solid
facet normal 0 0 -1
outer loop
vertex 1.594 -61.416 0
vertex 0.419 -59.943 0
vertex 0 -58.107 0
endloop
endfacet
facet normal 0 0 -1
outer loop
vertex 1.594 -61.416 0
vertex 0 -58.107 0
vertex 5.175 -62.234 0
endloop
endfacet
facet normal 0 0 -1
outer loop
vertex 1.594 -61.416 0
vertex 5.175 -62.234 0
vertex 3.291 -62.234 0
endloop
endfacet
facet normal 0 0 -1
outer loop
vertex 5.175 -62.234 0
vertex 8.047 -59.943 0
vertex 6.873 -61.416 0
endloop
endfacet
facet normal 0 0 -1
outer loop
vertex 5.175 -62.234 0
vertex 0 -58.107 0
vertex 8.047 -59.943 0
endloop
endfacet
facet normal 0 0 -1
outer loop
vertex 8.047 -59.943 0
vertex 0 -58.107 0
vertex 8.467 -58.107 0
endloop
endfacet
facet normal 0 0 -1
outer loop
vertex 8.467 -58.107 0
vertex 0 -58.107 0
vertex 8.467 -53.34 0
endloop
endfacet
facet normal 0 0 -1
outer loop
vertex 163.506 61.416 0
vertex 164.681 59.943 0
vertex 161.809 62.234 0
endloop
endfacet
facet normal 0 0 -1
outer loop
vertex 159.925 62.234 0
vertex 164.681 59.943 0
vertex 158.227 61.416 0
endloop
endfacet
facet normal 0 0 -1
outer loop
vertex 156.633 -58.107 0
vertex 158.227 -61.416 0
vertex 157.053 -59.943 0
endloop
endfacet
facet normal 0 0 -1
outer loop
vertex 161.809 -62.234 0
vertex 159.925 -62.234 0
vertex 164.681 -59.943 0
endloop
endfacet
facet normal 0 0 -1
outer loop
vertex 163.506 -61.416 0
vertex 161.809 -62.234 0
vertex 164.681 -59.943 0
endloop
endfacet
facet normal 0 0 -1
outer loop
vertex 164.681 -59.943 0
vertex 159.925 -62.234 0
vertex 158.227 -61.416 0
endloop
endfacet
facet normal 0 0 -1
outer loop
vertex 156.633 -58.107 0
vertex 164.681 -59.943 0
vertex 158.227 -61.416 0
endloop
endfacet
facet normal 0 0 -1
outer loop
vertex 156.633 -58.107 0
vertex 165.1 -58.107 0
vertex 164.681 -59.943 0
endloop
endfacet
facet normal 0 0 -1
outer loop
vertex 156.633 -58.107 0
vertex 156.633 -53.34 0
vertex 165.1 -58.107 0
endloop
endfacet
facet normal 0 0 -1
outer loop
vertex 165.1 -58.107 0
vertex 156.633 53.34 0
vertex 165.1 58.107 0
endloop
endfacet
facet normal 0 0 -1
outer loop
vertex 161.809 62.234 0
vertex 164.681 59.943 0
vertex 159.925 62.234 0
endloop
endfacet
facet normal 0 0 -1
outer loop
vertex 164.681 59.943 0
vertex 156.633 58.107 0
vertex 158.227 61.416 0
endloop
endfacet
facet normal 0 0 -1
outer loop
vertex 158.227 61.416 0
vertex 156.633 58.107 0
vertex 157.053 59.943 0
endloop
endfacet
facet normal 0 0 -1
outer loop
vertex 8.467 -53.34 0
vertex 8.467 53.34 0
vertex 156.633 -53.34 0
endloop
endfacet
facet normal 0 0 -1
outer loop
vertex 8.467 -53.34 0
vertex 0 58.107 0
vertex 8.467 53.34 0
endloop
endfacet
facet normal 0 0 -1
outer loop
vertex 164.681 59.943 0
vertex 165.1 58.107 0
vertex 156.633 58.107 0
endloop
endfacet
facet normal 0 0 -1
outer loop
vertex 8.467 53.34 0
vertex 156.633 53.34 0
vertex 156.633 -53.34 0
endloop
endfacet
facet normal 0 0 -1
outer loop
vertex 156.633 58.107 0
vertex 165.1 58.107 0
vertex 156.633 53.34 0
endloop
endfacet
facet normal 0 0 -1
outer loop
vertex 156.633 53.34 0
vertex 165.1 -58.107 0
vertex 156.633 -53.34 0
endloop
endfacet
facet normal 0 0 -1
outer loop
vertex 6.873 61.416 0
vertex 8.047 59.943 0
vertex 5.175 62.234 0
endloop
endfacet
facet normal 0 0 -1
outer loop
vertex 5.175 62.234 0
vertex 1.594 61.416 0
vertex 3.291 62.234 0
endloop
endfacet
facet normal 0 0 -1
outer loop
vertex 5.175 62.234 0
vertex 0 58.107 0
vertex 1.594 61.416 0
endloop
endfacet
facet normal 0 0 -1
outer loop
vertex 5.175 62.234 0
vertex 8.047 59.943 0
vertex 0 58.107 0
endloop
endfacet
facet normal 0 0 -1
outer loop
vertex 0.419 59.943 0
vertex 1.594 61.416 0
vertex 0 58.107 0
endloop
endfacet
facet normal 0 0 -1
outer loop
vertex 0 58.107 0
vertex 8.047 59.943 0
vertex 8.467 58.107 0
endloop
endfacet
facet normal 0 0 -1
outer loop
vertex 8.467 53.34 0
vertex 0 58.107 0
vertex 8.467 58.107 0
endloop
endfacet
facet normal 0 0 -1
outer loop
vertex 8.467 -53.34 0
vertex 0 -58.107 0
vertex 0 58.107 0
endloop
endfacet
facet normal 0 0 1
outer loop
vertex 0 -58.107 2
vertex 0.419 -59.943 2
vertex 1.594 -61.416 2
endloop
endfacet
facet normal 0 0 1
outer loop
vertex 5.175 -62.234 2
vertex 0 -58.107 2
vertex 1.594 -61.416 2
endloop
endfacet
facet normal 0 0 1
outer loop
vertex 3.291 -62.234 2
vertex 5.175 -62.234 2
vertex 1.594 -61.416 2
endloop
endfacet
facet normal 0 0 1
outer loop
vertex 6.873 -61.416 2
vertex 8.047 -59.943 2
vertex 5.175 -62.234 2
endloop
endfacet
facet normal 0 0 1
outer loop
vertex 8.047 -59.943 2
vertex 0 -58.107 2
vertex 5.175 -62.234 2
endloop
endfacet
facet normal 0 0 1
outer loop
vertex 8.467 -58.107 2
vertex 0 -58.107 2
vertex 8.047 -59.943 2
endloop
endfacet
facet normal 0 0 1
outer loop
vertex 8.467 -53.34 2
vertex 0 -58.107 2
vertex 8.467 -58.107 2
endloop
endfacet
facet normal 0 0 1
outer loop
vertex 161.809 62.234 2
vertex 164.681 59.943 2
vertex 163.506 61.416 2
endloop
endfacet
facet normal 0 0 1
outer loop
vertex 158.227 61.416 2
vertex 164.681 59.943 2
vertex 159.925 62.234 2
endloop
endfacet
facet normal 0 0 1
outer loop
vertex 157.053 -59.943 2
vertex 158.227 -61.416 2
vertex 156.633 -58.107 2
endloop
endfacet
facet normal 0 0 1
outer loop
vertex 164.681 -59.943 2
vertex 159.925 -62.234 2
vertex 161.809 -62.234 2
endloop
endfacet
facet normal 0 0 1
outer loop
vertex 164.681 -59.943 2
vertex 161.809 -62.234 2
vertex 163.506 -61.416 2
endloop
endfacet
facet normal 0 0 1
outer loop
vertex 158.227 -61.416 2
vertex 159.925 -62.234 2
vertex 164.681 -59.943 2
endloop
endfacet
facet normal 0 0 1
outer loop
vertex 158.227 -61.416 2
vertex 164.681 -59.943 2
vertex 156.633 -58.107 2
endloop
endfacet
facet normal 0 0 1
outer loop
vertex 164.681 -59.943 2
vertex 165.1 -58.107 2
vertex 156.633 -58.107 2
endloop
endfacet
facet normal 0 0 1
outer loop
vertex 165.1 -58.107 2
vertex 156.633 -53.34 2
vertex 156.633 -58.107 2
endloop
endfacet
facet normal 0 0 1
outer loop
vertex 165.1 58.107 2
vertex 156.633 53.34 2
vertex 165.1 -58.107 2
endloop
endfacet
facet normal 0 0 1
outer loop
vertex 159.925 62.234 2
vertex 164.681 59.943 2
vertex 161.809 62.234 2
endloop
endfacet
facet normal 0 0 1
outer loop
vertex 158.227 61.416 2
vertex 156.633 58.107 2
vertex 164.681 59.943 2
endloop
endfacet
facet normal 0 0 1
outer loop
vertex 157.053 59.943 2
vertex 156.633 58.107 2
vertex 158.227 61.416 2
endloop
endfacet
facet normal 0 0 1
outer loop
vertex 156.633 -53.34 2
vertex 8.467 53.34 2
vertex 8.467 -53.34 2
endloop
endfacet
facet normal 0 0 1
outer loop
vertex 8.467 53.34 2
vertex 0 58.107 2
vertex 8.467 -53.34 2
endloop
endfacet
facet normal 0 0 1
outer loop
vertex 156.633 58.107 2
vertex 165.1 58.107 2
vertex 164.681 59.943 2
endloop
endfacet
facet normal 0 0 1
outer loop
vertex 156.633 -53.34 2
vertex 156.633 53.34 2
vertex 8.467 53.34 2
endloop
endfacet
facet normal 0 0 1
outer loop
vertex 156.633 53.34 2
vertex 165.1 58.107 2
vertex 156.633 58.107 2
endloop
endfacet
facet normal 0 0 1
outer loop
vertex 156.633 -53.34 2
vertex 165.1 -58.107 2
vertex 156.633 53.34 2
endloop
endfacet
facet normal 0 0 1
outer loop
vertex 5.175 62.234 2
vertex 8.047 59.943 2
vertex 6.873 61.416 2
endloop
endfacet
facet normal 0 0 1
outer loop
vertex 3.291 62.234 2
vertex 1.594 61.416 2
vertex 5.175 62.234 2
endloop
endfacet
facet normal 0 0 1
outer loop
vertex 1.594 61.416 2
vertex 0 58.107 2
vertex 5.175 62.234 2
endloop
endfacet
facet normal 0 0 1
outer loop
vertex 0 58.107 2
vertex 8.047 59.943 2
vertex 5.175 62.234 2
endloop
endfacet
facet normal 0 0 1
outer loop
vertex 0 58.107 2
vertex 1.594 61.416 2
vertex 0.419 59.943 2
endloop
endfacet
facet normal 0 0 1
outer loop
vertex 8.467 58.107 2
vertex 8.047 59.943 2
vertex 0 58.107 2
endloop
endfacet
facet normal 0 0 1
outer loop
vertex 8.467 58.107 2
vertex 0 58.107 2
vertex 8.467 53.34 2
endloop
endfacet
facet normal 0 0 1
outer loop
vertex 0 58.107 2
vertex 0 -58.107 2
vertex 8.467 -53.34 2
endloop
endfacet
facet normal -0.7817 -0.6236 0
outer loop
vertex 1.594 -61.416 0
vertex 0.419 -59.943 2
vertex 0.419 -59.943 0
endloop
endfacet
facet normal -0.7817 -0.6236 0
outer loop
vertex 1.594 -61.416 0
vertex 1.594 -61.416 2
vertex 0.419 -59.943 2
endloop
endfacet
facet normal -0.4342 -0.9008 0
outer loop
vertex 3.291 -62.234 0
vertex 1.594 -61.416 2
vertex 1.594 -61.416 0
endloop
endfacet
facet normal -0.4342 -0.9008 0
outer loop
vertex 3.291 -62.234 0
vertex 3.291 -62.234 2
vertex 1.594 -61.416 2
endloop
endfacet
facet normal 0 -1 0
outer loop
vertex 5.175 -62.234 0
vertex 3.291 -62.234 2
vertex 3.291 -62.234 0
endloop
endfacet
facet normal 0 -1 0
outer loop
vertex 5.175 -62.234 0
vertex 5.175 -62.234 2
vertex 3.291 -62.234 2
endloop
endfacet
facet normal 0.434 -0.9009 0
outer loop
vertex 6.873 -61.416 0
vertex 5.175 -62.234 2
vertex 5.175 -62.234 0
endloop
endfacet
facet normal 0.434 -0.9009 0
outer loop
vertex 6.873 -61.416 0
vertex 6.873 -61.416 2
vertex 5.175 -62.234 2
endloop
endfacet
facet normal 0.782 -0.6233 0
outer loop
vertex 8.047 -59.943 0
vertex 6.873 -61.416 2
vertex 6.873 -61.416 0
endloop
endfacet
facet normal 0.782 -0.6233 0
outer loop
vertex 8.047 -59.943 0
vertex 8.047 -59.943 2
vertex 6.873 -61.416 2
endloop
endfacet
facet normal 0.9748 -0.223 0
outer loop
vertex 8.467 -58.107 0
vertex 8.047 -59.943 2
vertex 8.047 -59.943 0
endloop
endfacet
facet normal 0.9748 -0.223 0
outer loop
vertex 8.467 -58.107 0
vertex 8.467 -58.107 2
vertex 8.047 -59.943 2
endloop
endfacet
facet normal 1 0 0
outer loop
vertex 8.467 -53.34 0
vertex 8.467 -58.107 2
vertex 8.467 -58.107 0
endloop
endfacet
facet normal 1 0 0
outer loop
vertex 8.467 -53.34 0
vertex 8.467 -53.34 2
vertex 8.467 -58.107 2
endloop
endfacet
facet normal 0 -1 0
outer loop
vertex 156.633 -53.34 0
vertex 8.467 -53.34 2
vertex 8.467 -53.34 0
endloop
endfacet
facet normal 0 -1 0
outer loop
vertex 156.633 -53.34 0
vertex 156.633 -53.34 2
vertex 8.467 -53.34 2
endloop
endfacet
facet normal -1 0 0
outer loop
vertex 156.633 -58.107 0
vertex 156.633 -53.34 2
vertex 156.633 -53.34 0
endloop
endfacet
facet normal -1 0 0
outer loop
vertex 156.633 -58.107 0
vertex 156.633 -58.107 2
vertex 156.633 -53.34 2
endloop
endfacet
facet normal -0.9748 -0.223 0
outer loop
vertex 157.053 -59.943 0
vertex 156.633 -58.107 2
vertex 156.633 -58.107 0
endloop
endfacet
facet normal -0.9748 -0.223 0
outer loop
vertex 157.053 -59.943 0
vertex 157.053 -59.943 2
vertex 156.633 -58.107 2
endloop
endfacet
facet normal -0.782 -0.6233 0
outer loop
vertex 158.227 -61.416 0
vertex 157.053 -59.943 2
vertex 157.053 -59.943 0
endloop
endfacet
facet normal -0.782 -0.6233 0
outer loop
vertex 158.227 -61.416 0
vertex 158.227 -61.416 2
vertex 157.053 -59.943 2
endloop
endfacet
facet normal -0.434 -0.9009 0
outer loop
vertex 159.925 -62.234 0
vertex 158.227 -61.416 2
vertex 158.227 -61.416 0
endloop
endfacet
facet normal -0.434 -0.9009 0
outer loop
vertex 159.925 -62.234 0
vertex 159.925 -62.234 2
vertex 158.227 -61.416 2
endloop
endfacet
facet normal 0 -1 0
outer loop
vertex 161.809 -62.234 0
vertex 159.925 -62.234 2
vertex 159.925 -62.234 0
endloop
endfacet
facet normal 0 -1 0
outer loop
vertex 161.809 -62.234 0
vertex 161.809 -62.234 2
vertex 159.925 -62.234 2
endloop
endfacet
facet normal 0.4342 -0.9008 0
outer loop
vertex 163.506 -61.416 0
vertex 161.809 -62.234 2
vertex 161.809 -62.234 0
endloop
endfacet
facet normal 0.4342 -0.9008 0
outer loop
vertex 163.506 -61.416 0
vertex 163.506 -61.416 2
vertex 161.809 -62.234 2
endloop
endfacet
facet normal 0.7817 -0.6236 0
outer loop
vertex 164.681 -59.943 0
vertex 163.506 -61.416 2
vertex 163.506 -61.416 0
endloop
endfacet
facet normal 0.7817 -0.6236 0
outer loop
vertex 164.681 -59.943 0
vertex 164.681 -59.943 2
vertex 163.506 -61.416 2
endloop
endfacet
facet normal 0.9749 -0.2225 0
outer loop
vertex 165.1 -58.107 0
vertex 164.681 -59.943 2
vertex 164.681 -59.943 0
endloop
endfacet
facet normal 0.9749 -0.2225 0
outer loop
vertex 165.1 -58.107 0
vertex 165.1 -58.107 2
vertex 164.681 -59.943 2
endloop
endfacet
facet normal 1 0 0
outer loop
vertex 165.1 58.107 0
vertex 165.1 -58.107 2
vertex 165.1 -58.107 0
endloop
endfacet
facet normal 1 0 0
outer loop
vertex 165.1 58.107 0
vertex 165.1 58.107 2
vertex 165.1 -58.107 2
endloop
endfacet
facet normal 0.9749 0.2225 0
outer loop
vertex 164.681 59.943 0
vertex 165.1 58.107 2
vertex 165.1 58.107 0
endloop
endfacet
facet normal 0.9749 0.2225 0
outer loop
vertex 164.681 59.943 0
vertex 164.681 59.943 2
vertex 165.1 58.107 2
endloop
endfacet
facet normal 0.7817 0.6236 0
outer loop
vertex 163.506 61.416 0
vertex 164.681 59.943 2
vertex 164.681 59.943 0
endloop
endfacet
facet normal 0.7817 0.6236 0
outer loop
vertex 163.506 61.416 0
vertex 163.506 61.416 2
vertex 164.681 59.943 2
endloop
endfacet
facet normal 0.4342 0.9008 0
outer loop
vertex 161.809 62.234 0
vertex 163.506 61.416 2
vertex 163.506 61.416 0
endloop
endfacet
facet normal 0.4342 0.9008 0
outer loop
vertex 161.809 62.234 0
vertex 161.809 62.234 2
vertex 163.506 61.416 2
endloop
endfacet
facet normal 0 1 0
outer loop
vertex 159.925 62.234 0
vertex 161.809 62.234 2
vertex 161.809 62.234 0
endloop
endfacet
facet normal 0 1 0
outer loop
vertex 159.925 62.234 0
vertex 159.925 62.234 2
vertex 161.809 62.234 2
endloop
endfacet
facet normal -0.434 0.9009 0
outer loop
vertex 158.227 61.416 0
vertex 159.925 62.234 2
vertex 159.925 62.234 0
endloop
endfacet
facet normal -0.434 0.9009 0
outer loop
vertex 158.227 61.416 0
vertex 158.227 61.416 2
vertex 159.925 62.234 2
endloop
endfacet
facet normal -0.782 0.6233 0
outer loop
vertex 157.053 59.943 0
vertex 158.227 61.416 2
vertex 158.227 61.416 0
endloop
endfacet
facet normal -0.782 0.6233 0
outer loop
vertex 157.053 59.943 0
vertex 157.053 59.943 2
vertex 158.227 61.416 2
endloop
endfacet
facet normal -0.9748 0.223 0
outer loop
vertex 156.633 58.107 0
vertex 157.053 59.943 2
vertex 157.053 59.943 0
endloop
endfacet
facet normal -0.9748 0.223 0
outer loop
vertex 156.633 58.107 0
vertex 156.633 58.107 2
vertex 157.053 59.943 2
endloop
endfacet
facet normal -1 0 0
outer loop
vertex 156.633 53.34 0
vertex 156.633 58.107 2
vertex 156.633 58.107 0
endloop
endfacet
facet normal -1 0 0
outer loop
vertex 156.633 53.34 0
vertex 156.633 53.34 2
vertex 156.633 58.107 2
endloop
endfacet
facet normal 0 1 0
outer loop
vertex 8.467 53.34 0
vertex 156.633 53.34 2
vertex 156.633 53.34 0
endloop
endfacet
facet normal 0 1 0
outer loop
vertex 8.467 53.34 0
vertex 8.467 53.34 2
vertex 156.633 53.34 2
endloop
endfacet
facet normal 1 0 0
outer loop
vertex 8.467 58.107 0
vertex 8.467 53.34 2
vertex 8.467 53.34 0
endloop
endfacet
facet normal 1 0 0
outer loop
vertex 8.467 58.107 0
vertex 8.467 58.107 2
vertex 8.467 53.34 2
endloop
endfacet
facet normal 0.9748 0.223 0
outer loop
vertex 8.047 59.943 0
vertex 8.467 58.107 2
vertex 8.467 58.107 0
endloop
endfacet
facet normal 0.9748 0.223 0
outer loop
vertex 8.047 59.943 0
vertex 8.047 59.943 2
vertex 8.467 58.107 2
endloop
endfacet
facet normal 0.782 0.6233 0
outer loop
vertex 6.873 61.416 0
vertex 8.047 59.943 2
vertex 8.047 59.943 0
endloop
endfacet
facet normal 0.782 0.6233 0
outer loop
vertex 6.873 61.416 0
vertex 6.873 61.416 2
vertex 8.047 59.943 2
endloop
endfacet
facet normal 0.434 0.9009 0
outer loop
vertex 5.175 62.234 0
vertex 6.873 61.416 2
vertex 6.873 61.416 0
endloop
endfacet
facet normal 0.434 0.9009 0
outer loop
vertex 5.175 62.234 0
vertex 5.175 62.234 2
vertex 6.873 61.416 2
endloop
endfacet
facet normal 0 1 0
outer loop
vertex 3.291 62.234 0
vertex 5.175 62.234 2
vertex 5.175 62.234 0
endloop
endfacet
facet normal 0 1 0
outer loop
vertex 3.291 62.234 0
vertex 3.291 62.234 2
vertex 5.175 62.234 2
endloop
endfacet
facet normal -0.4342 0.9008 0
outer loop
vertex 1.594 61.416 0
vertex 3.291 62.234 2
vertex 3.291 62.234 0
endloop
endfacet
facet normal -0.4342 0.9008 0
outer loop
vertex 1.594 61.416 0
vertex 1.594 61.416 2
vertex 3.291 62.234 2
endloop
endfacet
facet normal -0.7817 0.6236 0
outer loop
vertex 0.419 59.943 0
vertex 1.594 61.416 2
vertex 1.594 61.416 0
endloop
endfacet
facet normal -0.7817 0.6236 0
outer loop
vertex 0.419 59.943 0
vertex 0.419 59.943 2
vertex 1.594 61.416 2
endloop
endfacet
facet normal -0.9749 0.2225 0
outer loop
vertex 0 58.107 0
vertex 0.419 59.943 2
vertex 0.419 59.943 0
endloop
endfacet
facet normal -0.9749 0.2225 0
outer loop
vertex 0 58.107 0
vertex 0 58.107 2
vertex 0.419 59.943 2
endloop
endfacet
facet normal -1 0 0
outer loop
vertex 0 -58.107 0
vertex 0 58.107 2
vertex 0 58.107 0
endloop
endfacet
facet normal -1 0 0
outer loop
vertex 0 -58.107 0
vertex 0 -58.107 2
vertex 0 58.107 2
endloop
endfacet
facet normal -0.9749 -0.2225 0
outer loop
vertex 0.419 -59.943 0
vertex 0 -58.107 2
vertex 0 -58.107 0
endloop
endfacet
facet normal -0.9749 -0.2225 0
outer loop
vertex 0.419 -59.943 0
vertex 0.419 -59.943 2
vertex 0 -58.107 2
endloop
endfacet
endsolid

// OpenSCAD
// Display Backplate for 7" Panel
// All dimensions in mm

// Parameters
plate_thickness = 2; // Adjust for test prints (try 2-3mm)

// Main rectangle dimensions (convert inches to mm)
main_width = 6.5 * 25.4;  // 158.75mm
main_height = 4.2 * 25.4;  // 106.68mm

// Corner tab dimensions
tab_height = 9;           // mm (measured with calipers)
tab_width = (1/3) * 25.4; // 8.47mm (1/3 inch)
tab_radius = tab_width / 2; // 4.23mm

// Create the backplate
linear_extrude(height = plate_thickness)
    backplate_profile();

// 2D profile module
module backplate_profile() {
    union() {
        // Main rectangle
        translate([0, -main_height/2, 0])
            square([main_width, main_height]);

        // Top-left tab (NW) - extends up from left side
        translate([0, main_height/2, 0])
            tab_shape();

        // Top-right tab (NE) - extends up from right side
        translate([main_width, main_height/2, 0])
            mirror([1, 0, 0])
                tab_shape();

        // Bottom-left tab (SW) - extends down from left side
        translate([0, -main_height/2, 0])
            mirror([0, 1, 0])
                tab_shape();

        // Bottom-right tab (SE) - extends down from right side
        translate([main_width-tab_width, -main_height/2, 0])
            mirror([0, 1, 0])
                tab_shape();
    }
}

// Single tab shape - half-rounded rectangle, flat side at origin
module tab_shape() {
    // The flat side connects to main rectangle at y=0
    // The rounded end extends outward in positive y direction
    hull() {
        // Rectangle portion (half of tab_width, extending from flat side)
        square([tab_width, tab_height - tab_radius]);

        // Half-circle at the outer end
        translate([tab_radius, tab_height - tab_radius, 0])
            circle(r = tab_radius);
    }
}
